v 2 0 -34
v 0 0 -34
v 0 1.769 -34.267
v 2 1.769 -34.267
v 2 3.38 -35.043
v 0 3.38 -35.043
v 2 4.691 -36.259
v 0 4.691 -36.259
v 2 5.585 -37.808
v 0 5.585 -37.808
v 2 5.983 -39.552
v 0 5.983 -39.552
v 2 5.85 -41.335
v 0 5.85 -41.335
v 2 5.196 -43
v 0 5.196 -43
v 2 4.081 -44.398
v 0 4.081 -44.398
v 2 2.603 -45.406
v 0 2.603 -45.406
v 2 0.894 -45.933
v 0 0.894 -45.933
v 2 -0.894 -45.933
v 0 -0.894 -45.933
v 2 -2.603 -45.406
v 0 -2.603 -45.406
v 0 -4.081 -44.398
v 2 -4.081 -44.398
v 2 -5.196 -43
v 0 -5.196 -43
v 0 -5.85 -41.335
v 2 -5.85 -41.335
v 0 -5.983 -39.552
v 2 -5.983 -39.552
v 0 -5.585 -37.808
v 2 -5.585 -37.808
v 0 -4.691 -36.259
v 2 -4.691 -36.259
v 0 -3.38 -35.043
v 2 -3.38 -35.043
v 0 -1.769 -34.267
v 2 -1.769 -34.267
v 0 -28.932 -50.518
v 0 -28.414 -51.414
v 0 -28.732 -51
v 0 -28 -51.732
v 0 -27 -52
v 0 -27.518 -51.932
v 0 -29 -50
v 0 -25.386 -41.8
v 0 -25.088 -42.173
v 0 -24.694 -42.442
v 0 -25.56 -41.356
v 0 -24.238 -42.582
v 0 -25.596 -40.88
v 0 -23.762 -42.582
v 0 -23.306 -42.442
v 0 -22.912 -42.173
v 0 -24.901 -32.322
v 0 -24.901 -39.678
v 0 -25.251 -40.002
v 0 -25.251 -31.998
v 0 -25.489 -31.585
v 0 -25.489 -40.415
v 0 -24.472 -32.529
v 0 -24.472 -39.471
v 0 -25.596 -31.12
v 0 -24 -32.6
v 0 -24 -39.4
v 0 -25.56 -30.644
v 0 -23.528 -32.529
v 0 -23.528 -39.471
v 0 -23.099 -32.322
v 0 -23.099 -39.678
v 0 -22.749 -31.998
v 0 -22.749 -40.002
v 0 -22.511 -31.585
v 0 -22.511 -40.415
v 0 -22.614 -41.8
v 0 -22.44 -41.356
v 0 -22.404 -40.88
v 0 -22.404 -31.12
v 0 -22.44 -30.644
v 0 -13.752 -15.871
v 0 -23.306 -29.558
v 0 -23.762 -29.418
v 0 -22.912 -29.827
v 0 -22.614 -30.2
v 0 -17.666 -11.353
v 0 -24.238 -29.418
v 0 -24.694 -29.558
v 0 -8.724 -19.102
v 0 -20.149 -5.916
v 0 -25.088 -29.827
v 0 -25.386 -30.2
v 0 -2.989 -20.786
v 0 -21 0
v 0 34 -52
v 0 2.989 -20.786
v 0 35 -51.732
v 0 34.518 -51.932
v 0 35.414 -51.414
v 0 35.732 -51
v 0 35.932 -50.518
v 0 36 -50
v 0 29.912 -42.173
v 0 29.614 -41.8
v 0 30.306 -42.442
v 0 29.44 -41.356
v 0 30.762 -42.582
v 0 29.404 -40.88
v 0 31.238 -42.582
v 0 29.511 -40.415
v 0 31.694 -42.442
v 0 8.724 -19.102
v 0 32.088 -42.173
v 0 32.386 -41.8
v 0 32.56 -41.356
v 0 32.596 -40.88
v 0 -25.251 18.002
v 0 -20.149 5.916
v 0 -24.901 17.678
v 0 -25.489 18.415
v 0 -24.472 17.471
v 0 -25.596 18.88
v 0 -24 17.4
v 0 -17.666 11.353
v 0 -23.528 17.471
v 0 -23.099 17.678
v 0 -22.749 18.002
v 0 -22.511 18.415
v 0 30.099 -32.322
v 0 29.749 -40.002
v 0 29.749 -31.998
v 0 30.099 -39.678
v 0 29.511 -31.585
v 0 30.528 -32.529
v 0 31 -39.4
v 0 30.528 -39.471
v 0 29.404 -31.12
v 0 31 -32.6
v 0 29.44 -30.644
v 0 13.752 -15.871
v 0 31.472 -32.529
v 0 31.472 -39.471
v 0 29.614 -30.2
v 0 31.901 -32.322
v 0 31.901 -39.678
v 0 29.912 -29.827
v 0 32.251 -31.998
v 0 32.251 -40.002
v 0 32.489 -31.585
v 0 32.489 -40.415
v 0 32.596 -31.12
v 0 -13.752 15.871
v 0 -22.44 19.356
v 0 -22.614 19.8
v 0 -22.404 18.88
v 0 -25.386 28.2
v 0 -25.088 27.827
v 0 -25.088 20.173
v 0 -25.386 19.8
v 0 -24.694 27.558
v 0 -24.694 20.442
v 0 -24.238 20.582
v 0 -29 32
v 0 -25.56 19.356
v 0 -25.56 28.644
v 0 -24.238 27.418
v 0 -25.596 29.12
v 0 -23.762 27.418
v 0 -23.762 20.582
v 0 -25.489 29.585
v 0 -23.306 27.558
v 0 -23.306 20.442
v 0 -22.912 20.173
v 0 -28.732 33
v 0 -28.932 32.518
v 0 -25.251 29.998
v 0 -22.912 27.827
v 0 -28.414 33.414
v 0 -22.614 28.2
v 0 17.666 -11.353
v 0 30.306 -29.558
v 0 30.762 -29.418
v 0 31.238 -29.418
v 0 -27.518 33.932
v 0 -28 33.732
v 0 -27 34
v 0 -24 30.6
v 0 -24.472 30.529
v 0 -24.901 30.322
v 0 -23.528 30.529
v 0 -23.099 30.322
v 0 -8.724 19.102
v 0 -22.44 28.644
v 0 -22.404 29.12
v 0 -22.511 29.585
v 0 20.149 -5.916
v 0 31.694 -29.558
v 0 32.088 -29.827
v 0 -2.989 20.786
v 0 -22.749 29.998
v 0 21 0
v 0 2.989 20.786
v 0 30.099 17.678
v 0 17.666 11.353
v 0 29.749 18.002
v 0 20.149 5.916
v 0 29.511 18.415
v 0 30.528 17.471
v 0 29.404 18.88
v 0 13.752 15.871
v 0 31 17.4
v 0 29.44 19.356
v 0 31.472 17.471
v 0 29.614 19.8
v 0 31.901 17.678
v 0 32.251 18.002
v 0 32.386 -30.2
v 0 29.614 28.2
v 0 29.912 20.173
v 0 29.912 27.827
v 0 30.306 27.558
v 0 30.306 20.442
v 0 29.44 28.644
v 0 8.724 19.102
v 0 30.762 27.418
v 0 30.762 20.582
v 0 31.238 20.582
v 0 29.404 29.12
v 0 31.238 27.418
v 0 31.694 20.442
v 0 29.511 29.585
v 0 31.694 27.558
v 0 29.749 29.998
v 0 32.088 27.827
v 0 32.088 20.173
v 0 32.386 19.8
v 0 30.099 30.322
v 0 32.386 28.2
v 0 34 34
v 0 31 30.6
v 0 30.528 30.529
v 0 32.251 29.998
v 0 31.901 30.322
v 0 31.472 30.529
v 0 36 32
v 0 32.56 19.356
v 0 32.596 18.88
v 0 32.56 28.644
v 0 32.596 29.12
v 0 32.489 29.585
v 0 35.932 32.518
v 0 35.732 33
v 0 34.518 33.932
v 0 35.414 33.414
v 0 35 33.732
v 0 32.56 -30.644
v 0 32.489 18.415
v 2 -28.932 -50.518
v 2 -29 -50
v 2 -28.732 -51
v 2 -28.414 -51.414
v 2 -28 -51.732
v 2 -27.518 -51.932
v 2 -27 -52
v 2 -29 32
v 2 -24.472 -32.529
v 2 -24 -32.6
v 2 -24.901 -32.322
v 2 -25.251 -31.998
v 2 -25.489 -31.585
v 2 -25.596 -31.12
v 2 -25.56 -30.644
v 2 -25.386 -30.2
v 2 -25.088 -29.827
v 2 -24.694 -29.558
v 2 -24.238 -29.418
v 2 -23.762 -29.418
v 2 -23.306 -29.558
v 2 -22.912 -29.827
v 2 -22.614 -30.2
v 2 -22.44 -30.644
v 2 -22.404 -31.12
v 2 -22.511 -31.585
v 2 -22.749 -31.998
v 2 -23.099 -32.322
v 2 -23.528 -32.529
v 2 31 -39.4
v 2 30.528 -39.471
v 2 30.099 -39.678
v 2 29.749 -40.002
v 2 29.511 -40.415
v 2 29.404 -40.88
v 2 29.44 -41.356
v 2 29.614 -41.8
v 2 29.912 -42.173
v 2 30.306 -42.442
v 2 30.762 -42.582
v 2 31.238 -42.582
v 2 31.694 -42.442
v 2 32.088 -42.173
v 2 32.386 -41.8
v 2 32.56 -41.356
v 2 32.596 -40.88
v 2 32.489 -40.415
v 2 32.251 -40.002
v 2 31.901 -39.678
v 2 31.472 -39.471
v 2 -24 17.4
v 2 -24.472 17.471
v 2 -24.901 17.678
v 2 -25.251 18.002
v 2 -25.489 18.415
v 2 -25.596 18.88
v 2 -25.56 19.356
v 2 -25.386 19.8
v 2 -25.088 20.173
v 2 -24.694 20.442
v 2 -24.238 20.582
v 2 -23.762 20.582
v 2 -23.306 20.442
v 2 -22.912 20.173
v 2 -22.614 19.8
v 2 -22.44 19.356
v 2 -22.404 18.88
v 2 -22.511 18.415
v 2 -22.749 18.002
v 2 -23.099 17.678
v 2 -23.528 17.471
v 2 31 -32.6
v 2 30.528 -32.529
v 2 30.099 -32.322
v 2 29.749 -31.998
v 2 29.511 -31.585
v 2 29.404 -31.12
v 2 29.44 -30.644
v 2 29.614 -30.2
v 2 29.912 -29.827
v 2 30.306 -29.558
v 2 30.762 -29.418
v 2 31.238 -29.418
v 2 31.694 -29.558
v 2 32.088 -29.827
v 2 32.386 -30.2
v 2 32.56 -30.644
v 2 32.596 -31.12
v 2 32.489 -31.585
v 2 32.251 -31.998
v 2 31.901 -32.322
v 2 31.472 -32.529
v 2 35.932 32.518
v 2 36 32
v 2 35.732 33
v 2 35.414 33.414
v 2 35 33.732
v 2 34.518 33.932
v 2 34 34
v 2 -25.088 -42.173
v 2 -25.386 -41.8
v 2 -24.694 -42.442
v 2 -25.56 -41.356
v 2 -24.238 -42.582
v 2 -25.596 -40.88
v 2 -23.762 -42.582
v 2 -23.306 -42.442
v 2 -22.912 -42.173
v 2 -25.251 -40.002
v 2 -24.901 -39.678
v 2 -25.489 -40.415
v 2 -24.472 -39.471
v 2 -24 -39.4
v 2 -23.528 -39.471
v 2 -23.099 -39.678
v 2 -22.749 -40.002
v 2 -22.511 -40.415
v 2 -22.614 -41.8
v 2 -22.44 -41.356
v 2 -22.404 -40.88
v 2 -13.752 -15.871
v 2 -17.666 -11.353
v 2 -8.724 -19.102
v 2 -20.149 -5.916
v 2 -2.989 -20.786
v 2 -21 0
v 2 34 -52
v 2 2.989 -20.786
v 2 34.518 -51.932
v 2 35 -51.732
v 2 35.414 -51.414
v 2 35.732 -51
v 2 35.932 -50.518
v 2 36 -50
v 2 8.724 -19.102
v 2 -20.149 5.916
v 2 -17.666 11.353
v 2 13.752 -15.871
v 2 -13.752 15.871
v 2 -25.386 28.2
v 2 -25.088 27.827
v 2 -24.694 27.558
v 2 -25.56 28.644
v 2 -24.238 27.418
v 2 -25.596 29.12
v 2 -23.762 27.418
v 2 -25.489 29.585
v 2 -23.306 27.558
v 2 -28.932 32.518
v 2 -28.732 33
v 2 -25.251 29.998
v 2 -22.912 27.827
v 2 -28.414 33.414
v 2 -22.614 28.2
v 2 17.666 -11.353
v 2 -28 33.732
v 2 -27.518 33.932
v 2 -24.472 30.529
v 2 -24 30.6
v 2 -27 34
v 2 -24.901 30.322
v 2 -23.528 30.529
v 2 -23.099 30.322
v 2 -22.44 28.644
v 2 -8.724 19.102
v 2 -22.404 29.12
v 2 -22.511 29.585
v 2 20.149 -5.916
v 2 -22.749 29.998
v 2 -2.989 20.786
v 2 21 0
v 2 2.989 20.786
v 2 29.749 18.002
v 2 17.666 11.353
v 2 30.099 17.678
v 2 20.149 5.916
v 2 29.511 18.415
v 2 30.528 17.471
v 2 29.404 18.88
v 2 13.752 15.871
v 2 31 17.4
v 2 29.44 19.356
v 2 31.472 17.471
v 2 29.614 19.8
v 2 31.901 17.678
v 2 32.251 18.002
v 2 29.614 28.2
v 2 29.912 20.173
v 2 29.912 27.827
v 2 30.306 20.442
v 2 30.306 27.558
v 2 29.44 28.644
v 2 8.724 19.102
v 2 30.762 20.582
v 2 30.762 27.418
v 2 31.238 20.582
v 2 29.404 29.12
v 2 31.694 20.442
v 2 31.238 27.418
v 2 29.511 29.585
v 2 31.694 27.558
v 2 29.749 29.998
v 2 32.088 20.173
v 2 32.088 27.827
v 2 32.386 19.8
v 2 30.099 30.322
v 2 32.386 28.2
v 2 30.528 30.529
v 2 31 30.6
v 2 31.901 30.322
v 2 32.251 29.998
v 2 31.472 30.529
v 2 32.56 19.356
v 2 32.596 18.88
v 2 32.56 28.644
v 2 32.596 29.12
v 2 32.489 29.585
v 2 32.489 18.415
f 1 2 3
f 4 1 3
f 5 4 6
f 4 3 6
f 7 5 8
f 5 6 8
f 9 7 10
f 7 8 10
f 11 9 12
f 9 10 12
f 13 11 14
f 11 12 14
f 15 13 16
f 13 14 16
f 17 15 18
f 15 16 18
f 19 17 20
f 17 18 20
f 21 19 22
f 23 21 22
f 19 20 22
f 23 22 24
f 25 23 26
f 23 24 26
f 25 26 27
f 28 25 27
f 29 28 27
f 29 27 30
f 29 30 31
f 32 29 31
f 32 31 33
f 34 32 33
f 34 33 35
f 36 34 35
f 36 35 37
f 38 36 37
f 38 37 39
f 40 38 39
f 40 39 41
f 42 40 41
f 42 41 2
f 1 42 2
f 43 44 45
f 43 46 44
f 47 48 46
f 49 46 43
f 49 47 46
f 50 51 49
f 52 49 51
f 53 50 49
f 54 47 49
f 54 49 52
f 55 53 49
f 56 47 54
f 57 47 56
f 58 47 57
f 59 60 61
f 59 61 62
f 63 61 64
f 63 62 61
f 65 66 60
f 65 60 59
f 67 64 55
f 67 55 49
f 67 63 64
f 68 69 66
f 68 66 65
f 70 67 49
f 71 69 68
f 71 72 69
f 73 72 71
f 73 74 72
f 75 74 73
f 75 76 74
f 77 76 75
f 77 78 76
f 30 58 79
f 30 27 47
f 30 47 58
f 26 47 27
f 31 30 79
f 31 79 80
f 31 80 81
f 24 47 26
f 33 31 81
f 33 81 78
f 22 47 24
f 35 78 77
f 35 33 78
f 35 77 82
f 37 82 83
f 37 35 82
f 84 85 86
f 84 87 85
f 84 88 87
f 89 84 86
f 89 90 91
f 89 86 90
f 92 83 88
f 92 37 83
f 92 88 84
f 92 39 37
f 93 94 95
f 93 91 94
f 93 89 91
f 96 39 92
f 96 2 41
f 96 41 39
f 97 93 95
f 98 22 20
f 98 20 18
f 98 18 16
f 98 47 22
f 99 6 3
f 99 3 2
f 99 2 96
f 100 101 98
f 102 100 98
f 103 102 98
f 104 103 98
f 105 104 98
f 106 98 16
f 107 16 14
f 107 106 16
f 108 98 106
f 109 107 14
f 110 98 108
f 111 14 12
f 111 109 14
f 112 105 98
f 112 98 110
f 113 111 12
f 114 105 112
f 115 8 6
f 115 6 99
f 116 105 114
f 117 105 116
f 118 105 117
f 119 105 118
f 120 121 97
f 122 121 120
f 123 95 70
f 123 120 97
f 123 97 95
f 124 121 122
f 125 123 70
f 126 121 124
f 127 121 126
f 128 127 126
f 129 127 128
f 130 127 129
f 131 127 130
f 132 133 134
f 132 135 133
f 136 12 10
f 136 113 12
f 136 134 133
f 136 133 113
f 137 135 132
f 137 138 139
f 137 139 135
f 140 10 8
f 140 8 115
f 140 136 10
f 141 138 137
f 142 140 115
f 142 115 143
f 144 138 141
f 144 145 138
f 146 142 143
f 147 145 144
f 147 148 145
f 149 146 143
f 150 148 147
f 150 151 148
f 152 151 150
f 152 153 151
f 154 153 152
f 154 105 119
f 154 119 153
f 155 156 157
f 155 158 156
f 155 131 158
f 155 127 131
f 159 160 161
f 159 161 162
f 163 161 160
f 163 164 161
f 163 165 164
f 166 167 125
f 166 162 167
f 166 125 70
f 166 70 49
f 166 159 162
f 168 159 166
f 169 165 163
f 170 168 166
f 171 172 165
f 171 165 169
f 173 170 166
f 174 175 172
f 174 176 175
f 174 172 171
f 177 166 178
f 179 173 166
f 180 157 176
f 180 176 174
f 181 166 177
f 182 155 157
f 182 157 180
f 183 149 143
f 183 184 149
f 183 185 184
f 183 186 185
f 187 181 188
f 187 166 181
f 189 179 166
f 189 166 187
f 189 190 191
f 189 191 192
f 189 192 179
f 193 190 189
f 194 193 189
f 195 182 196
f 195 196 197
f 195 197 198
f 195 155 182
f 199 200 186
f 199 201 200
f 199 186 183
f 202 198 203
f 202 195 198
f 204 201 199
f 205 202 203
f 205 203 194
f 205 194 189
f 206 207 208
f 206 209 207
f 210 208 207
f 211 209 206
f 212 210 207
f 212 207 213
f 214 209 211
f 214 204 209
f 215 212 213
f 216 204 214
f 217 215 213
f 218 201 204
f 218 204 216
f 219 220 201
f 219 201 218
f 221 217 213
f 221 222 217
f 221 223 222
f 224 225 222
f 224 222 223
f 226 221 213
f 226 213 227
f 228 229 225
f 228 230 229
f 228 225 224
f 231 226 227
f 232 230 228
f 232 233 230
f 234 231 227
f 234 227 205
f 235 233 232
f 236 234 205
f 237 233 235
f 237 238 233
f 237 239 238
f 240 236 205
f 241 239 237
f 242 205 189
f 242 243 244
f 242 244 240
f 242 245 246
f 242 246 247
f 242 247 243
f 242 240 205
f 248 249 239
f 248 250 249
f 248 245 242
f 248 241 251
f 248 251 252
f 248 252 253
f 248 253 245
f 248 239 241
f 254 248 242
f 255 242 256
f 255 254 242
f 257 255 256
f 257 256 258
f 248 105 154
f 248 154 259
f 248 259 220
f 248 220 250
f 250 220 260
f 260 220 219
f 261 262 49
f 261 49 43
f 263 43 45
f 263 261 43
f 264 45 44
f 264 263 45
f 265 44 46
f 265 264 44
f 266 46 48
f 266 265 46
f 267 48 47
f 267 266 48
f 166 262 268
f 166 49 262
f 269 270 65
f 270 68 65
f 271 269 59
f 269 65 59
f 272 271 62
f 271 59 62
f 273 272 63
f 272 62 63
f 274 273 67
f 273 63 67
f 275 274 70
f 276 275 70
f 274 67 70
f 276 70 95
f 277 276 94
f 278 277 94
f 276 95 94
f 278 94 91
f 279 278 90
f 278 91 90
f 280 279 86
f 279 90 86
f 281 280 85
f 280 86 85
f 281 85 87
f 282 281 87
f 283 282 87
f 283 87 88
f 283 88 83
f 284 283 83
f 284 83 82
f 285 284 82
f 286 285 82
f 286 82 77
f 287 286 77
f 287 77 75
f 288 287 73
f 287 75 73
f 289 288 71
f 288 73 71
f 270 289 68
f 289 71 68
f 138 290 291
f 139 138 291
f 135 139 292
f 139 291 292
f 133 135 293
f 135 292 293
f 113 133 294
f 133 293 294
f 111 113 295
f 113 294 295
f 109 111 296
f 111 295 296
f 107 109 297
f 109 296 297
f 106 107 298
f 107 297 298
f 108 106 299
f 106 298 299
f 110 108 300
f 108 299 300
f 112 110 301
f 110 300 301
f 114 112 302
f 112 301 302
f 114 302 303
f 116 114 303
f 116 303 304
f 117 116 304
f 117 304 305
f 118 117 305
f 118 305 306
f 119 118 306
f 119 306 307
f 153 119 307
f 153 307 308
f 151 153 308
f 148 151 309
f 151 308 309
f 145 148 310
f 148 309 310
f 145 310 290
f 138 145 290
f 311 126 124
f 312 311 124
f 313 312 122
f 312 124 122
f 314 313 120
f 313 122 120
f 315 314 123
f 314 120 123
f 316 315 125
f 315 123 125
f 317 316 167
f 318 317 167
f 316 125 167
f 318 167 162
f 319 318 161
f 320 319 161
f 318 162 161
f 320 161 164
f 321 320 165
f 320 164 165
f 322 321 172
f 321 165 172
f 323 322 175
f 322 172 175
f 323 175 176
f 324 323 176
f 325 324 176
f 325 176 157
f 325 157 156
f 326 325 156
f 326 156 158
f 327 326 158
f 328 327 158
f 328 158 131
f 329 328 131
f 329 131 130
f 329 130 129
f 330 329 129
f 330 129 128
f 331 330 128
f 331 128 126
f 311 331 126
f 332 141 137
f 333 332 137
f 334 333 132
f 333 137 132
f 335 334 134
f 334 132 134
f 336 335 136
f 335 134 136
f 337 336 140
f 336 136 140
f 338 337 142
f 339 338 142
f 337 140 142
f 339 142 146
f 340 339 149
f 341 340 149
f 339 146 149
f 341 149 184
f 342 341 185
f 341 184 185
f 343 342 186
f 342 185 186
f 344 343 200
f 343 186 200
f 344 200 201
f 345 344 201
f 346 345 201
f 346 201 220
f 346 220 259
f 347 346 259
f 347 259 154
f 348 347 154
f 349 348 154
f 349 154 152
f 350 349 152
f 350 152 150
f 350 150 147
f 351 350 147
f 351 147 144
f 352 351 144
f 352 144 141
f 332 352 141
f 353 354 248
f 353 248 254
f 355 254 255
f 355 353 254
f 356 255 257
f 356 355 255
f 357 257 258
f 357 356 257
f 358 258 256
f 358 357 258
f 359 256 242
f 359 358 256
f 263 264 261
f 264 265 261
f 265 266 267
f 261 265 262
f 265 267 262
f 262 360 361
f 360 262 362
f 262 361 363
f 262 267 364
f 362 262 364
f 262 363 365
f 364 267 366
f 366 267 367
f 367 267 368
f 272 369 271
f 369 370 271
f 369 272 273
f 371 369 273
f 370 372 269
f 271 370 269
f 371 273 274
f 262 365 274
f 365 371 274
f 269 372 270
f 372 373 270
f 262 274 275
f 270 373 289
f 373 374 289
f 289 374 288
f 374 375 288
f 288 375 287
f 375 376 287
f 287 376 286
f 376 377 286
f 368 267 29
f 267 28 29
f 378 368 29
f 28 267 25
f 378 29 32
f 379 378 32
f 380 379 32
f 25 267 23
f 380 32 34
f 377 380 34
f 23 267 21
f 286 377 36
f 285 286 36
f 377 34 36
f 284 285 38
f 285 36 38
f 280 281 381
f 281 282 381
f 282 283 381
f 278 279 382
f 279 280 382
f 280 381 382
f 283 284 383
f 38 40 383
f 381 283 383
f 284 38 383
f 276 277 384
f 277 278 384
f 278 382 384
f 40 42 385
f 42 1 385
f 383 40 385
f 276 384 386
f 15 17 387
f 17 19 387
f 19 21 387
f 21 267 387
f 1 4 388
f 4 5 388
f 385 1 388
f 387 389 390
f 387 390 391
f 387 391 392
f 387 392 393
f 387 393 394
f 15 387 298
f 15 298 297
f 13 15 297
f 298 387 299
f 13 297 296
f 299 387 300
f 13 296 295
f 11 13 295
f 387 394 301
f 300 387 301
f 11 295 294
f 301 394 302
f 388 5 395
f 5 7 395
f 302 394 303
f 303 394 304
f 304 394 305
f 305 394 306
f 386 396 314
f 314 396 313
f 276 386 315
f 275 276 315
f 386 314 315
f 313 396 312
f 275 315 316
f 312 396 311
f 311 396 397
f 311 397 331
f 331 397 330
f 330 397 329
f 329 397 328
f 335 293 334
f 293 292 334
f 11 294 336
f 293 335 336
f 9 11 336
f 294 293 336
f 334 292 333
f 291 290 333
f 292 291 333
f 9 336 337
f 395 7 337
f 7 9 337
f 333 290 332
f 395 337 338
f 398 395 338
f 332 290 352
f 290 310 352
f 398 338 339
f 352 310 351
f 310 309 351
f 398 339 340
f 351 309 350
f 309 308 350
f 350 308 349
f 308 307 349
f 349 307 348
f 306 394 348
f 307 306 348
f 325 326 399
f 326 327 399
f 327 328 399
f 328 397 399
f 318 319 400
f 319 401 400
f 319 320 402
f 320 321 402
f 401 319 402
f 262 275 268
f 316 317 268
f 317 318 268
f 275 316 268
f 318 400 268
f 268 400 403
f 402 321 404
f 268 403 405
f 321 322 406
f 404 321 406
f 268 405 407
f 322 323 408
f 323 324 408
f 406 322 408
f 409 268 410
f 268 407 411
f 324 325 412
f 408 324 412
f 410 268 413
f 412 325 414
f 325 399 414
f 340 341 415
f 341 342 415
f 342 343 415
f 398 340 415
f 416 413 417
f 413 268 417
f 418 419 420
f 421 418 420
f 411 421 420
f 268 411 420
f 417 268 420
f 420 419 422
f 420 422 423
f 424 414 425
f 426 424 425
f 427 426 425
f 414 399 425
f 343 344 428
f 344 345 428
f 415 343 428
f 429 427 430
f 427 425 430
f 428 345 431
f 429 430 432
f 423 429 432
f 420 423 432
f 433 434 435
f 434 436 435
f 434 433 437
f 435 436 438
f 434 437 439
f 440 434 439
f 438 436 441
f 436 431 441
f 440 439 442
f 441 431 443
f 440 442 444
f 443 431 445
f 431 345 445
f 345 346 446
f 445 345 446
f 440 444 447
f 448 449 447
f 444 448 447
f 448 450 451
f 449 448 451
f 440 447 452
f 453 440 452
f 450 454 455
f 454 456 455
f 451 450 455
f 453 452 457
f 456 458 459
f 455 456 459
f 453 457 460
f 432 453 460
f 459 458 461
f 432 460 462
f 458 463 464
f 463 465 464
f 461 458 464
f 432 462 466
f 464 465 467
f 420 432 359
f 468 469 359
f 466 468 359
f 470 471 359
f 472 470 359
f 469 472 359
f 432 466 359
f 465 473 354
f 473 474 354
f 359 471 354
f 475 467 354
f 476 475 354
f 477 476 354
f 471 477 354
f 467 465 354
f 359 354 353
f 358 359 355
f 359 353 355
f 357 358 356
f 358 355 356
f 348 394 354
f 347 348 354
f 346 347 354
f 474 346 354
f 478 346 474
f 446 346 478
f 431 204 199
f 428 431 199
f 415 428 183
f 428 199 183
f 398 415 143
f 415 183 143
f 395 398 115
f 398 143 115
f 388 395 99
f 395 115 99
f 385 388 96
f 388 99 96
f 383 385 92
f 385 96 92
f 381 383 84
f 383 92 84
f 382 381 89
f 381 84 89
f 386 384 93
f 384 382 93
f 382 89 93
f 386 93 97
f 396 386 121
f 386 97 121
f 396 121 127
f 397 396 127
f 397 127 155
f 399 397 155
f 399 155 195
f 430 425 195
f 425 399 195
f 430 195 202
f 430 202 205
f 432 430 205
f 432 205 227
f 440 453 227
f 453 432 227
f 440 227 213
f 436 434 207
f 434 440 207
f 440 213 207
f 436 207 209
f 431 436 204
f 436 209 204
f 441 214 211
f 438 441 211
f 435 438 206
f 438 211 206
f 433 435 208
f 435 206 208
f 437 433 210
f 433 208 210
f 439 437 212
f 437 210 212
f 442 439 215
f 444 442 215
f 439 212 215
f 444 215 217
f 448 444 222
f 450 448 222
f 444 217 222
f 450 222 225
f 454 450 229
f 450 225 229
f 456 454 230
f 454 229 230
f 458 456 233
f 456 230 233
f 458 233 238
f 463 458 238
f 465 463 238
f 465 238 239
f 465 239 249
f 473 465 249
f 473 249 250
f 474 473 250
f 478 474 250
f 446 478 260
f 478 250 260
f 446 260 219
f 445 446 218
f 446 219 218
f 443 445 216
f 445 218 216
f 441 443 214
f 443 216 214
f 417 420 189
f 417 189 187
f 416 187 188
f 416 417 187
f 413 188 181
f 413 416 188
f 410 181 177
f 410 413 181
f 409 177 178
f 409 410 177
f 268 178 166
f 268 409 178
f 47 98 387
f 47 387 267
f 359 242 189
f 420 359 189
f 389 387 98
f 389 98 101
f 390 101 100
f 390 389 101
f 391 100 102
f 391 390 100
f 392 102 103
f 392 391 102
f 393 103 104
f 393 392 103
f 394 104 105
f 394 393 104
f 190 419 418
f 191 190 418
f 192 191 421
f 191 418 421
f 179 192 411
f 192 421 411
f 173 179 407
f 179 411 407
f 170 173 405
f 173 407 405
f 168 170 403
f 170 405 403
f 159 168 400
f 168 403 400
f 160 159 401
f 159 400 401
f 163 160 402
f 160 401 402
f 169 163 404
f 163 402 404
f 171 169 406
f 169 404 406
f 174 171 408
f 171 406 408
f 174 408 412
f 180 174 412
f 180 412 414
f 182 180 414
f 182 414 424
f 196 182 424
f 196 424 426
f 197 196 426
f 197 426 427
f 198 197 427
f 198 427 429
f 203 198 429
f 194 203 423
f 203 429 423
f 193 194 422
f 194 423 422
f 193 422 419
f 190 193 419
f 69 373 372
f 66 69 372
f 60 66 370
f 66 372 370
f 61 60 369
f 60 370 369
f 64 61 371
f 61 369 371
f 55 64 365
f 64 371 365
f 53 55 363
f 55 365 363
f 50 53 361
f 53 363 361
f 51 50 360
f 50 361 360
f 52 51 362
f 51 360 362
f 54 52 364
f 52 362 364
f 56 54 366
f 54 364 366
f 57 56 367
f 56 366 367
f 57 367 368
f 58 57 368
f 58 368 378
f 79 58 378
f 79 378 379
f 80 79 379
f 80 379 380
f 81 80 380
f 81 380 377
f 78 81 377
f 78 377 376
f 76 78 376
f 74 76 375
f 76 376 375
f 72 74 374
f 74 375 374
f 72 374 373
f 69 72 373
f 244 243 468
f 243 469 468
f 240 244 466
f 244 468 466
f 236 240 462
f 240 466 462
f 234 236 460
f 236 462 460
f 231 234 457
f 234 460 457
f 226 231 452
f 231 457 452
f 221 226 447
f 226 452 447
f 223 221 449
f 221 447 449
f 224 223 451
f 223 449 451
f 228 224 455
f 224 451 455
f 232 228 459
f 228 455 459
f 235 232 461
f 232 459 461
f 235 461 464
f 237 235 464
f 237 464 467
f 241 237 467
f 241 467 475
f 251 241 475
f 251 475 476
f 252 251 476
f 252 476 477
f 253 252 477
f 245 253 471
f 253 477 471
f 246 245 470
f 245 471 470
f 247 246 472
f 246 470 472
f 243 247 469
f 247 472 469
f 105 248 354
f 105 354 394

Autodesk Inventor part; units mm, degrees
ref_plane "YZ Plane" through (0, 0, 0) normal (1, 0, 0) x (0, 1, 0)
ref_plane "XZ Plane" through (0, 0, 0) normal (0, 1, 0) x (-1, 0, 0)
ref_plane "XY Plane" through (0, 0, 0) normal (0, 0, 1) x (1, 0, 0)
sketch "Sketch1" plane through (0, 0, 0) normal (1, 0, 0) x (0, 1, 0)
  circle A0 centre (0, 0) radius 21
  line L0 (36, -46) -> (36, 34)
  line L1 (36, 34) -> (-29, 34)
  line L2 (-29, 34) -> (-29, -46)
  line L3 (-29, -46) -> (36, -46)
  point P0 (0, -17.5)
  point P1 (17.5, 0)
  point P2 (0, 17.5)
  point P3 (-17.5, 0)
  point P4 (0, -30)
  point P5 (0, 30)
  point P6 (31, -41)
  point P7 (31, 29)
  point P8 (-24, 29)
  point P9 (-24, -41)
  dimension "d6" = 30
  dimension "d9" = 360
  dimension "d15" = 5
  dimension "d16" = 5
  dimension "d17" = 80
  dimension "d18" = 65
  dimension "d28" = 5
  dimension "d29" = 55
  dimension "d30" = 55
  dimension "d38" = 42
extrude "Extrusion1" add sketch "Sketch1" along normal blind 2
hole "Hole1" at (0, 0, -17.5) at (0, 17.5, 0) at (0, 0, 17.5) at (0, -17.5, 0) at (0, 31, -41) at (0, 31, 29) at (0, -24, 29) at (0, -24, -41) direction (1, 0, 0) diameter 3.2 depth 43.75 tip angle 118
sketch "Sketch2" plane through (0, 0, 0) normal (-1, 0, 0) x (0, 0, 1)
  circle A0 centre (-40, 0) radius 6
  line L0 (-46, 36) -> (34, 36) projected
  line L1 (-46, 36) -> (-52, 36)
  line L2 (-52, 36) -> (-52, -29)
  line L3 (-52, -29) -> (-46, -29)
  line L4 (-46, -29) -> (-46, 36)
  point P0 (0, 0)
  point P1 (0, 25.1294)
  point P2 (0, -32.6005)
  dimension "d31" = 40
  dimension "d32" = 12
  dimension "d33" = 6
extrude "Extrusion2" add sketch "Sketch2" against normal blind 2 contours L4 L3 L2 L1
extrude "Extrusion3" cut sketch "Sketch2" against normal blind 2 contours A0
sketch "Sketch3" plane through (2, 0, 0) normal (1, 0, 0) x (0, 0, -1)
  circle A0 centre (-29, 31) radius 1.6 projected
  circle A1 centre (41, 31) radius 1.6 projected
  point P0 (0, 0)
  point P1 (-19, 31)
  point P2 (31, 31)
  point P3 (-19, -24)
  point P4 (31, -24)
  dimension "d39" = 10
  dimension "d40" = 10
hole "Hole2" at (2, 31, 19) at (2, 31, -31) at (2, -24, 19) at (2, -24, -31) direction (-1, 0, 0) diameter 3.2 depth 43.75 tip angle 118
fillet "Fillet1" radius 2 4 edges at (1, 36, 34) (1, 36, -52) (1, -29, -52) (1, -29, 34)
properties part number "motor" material "アルミニウム 6061"
